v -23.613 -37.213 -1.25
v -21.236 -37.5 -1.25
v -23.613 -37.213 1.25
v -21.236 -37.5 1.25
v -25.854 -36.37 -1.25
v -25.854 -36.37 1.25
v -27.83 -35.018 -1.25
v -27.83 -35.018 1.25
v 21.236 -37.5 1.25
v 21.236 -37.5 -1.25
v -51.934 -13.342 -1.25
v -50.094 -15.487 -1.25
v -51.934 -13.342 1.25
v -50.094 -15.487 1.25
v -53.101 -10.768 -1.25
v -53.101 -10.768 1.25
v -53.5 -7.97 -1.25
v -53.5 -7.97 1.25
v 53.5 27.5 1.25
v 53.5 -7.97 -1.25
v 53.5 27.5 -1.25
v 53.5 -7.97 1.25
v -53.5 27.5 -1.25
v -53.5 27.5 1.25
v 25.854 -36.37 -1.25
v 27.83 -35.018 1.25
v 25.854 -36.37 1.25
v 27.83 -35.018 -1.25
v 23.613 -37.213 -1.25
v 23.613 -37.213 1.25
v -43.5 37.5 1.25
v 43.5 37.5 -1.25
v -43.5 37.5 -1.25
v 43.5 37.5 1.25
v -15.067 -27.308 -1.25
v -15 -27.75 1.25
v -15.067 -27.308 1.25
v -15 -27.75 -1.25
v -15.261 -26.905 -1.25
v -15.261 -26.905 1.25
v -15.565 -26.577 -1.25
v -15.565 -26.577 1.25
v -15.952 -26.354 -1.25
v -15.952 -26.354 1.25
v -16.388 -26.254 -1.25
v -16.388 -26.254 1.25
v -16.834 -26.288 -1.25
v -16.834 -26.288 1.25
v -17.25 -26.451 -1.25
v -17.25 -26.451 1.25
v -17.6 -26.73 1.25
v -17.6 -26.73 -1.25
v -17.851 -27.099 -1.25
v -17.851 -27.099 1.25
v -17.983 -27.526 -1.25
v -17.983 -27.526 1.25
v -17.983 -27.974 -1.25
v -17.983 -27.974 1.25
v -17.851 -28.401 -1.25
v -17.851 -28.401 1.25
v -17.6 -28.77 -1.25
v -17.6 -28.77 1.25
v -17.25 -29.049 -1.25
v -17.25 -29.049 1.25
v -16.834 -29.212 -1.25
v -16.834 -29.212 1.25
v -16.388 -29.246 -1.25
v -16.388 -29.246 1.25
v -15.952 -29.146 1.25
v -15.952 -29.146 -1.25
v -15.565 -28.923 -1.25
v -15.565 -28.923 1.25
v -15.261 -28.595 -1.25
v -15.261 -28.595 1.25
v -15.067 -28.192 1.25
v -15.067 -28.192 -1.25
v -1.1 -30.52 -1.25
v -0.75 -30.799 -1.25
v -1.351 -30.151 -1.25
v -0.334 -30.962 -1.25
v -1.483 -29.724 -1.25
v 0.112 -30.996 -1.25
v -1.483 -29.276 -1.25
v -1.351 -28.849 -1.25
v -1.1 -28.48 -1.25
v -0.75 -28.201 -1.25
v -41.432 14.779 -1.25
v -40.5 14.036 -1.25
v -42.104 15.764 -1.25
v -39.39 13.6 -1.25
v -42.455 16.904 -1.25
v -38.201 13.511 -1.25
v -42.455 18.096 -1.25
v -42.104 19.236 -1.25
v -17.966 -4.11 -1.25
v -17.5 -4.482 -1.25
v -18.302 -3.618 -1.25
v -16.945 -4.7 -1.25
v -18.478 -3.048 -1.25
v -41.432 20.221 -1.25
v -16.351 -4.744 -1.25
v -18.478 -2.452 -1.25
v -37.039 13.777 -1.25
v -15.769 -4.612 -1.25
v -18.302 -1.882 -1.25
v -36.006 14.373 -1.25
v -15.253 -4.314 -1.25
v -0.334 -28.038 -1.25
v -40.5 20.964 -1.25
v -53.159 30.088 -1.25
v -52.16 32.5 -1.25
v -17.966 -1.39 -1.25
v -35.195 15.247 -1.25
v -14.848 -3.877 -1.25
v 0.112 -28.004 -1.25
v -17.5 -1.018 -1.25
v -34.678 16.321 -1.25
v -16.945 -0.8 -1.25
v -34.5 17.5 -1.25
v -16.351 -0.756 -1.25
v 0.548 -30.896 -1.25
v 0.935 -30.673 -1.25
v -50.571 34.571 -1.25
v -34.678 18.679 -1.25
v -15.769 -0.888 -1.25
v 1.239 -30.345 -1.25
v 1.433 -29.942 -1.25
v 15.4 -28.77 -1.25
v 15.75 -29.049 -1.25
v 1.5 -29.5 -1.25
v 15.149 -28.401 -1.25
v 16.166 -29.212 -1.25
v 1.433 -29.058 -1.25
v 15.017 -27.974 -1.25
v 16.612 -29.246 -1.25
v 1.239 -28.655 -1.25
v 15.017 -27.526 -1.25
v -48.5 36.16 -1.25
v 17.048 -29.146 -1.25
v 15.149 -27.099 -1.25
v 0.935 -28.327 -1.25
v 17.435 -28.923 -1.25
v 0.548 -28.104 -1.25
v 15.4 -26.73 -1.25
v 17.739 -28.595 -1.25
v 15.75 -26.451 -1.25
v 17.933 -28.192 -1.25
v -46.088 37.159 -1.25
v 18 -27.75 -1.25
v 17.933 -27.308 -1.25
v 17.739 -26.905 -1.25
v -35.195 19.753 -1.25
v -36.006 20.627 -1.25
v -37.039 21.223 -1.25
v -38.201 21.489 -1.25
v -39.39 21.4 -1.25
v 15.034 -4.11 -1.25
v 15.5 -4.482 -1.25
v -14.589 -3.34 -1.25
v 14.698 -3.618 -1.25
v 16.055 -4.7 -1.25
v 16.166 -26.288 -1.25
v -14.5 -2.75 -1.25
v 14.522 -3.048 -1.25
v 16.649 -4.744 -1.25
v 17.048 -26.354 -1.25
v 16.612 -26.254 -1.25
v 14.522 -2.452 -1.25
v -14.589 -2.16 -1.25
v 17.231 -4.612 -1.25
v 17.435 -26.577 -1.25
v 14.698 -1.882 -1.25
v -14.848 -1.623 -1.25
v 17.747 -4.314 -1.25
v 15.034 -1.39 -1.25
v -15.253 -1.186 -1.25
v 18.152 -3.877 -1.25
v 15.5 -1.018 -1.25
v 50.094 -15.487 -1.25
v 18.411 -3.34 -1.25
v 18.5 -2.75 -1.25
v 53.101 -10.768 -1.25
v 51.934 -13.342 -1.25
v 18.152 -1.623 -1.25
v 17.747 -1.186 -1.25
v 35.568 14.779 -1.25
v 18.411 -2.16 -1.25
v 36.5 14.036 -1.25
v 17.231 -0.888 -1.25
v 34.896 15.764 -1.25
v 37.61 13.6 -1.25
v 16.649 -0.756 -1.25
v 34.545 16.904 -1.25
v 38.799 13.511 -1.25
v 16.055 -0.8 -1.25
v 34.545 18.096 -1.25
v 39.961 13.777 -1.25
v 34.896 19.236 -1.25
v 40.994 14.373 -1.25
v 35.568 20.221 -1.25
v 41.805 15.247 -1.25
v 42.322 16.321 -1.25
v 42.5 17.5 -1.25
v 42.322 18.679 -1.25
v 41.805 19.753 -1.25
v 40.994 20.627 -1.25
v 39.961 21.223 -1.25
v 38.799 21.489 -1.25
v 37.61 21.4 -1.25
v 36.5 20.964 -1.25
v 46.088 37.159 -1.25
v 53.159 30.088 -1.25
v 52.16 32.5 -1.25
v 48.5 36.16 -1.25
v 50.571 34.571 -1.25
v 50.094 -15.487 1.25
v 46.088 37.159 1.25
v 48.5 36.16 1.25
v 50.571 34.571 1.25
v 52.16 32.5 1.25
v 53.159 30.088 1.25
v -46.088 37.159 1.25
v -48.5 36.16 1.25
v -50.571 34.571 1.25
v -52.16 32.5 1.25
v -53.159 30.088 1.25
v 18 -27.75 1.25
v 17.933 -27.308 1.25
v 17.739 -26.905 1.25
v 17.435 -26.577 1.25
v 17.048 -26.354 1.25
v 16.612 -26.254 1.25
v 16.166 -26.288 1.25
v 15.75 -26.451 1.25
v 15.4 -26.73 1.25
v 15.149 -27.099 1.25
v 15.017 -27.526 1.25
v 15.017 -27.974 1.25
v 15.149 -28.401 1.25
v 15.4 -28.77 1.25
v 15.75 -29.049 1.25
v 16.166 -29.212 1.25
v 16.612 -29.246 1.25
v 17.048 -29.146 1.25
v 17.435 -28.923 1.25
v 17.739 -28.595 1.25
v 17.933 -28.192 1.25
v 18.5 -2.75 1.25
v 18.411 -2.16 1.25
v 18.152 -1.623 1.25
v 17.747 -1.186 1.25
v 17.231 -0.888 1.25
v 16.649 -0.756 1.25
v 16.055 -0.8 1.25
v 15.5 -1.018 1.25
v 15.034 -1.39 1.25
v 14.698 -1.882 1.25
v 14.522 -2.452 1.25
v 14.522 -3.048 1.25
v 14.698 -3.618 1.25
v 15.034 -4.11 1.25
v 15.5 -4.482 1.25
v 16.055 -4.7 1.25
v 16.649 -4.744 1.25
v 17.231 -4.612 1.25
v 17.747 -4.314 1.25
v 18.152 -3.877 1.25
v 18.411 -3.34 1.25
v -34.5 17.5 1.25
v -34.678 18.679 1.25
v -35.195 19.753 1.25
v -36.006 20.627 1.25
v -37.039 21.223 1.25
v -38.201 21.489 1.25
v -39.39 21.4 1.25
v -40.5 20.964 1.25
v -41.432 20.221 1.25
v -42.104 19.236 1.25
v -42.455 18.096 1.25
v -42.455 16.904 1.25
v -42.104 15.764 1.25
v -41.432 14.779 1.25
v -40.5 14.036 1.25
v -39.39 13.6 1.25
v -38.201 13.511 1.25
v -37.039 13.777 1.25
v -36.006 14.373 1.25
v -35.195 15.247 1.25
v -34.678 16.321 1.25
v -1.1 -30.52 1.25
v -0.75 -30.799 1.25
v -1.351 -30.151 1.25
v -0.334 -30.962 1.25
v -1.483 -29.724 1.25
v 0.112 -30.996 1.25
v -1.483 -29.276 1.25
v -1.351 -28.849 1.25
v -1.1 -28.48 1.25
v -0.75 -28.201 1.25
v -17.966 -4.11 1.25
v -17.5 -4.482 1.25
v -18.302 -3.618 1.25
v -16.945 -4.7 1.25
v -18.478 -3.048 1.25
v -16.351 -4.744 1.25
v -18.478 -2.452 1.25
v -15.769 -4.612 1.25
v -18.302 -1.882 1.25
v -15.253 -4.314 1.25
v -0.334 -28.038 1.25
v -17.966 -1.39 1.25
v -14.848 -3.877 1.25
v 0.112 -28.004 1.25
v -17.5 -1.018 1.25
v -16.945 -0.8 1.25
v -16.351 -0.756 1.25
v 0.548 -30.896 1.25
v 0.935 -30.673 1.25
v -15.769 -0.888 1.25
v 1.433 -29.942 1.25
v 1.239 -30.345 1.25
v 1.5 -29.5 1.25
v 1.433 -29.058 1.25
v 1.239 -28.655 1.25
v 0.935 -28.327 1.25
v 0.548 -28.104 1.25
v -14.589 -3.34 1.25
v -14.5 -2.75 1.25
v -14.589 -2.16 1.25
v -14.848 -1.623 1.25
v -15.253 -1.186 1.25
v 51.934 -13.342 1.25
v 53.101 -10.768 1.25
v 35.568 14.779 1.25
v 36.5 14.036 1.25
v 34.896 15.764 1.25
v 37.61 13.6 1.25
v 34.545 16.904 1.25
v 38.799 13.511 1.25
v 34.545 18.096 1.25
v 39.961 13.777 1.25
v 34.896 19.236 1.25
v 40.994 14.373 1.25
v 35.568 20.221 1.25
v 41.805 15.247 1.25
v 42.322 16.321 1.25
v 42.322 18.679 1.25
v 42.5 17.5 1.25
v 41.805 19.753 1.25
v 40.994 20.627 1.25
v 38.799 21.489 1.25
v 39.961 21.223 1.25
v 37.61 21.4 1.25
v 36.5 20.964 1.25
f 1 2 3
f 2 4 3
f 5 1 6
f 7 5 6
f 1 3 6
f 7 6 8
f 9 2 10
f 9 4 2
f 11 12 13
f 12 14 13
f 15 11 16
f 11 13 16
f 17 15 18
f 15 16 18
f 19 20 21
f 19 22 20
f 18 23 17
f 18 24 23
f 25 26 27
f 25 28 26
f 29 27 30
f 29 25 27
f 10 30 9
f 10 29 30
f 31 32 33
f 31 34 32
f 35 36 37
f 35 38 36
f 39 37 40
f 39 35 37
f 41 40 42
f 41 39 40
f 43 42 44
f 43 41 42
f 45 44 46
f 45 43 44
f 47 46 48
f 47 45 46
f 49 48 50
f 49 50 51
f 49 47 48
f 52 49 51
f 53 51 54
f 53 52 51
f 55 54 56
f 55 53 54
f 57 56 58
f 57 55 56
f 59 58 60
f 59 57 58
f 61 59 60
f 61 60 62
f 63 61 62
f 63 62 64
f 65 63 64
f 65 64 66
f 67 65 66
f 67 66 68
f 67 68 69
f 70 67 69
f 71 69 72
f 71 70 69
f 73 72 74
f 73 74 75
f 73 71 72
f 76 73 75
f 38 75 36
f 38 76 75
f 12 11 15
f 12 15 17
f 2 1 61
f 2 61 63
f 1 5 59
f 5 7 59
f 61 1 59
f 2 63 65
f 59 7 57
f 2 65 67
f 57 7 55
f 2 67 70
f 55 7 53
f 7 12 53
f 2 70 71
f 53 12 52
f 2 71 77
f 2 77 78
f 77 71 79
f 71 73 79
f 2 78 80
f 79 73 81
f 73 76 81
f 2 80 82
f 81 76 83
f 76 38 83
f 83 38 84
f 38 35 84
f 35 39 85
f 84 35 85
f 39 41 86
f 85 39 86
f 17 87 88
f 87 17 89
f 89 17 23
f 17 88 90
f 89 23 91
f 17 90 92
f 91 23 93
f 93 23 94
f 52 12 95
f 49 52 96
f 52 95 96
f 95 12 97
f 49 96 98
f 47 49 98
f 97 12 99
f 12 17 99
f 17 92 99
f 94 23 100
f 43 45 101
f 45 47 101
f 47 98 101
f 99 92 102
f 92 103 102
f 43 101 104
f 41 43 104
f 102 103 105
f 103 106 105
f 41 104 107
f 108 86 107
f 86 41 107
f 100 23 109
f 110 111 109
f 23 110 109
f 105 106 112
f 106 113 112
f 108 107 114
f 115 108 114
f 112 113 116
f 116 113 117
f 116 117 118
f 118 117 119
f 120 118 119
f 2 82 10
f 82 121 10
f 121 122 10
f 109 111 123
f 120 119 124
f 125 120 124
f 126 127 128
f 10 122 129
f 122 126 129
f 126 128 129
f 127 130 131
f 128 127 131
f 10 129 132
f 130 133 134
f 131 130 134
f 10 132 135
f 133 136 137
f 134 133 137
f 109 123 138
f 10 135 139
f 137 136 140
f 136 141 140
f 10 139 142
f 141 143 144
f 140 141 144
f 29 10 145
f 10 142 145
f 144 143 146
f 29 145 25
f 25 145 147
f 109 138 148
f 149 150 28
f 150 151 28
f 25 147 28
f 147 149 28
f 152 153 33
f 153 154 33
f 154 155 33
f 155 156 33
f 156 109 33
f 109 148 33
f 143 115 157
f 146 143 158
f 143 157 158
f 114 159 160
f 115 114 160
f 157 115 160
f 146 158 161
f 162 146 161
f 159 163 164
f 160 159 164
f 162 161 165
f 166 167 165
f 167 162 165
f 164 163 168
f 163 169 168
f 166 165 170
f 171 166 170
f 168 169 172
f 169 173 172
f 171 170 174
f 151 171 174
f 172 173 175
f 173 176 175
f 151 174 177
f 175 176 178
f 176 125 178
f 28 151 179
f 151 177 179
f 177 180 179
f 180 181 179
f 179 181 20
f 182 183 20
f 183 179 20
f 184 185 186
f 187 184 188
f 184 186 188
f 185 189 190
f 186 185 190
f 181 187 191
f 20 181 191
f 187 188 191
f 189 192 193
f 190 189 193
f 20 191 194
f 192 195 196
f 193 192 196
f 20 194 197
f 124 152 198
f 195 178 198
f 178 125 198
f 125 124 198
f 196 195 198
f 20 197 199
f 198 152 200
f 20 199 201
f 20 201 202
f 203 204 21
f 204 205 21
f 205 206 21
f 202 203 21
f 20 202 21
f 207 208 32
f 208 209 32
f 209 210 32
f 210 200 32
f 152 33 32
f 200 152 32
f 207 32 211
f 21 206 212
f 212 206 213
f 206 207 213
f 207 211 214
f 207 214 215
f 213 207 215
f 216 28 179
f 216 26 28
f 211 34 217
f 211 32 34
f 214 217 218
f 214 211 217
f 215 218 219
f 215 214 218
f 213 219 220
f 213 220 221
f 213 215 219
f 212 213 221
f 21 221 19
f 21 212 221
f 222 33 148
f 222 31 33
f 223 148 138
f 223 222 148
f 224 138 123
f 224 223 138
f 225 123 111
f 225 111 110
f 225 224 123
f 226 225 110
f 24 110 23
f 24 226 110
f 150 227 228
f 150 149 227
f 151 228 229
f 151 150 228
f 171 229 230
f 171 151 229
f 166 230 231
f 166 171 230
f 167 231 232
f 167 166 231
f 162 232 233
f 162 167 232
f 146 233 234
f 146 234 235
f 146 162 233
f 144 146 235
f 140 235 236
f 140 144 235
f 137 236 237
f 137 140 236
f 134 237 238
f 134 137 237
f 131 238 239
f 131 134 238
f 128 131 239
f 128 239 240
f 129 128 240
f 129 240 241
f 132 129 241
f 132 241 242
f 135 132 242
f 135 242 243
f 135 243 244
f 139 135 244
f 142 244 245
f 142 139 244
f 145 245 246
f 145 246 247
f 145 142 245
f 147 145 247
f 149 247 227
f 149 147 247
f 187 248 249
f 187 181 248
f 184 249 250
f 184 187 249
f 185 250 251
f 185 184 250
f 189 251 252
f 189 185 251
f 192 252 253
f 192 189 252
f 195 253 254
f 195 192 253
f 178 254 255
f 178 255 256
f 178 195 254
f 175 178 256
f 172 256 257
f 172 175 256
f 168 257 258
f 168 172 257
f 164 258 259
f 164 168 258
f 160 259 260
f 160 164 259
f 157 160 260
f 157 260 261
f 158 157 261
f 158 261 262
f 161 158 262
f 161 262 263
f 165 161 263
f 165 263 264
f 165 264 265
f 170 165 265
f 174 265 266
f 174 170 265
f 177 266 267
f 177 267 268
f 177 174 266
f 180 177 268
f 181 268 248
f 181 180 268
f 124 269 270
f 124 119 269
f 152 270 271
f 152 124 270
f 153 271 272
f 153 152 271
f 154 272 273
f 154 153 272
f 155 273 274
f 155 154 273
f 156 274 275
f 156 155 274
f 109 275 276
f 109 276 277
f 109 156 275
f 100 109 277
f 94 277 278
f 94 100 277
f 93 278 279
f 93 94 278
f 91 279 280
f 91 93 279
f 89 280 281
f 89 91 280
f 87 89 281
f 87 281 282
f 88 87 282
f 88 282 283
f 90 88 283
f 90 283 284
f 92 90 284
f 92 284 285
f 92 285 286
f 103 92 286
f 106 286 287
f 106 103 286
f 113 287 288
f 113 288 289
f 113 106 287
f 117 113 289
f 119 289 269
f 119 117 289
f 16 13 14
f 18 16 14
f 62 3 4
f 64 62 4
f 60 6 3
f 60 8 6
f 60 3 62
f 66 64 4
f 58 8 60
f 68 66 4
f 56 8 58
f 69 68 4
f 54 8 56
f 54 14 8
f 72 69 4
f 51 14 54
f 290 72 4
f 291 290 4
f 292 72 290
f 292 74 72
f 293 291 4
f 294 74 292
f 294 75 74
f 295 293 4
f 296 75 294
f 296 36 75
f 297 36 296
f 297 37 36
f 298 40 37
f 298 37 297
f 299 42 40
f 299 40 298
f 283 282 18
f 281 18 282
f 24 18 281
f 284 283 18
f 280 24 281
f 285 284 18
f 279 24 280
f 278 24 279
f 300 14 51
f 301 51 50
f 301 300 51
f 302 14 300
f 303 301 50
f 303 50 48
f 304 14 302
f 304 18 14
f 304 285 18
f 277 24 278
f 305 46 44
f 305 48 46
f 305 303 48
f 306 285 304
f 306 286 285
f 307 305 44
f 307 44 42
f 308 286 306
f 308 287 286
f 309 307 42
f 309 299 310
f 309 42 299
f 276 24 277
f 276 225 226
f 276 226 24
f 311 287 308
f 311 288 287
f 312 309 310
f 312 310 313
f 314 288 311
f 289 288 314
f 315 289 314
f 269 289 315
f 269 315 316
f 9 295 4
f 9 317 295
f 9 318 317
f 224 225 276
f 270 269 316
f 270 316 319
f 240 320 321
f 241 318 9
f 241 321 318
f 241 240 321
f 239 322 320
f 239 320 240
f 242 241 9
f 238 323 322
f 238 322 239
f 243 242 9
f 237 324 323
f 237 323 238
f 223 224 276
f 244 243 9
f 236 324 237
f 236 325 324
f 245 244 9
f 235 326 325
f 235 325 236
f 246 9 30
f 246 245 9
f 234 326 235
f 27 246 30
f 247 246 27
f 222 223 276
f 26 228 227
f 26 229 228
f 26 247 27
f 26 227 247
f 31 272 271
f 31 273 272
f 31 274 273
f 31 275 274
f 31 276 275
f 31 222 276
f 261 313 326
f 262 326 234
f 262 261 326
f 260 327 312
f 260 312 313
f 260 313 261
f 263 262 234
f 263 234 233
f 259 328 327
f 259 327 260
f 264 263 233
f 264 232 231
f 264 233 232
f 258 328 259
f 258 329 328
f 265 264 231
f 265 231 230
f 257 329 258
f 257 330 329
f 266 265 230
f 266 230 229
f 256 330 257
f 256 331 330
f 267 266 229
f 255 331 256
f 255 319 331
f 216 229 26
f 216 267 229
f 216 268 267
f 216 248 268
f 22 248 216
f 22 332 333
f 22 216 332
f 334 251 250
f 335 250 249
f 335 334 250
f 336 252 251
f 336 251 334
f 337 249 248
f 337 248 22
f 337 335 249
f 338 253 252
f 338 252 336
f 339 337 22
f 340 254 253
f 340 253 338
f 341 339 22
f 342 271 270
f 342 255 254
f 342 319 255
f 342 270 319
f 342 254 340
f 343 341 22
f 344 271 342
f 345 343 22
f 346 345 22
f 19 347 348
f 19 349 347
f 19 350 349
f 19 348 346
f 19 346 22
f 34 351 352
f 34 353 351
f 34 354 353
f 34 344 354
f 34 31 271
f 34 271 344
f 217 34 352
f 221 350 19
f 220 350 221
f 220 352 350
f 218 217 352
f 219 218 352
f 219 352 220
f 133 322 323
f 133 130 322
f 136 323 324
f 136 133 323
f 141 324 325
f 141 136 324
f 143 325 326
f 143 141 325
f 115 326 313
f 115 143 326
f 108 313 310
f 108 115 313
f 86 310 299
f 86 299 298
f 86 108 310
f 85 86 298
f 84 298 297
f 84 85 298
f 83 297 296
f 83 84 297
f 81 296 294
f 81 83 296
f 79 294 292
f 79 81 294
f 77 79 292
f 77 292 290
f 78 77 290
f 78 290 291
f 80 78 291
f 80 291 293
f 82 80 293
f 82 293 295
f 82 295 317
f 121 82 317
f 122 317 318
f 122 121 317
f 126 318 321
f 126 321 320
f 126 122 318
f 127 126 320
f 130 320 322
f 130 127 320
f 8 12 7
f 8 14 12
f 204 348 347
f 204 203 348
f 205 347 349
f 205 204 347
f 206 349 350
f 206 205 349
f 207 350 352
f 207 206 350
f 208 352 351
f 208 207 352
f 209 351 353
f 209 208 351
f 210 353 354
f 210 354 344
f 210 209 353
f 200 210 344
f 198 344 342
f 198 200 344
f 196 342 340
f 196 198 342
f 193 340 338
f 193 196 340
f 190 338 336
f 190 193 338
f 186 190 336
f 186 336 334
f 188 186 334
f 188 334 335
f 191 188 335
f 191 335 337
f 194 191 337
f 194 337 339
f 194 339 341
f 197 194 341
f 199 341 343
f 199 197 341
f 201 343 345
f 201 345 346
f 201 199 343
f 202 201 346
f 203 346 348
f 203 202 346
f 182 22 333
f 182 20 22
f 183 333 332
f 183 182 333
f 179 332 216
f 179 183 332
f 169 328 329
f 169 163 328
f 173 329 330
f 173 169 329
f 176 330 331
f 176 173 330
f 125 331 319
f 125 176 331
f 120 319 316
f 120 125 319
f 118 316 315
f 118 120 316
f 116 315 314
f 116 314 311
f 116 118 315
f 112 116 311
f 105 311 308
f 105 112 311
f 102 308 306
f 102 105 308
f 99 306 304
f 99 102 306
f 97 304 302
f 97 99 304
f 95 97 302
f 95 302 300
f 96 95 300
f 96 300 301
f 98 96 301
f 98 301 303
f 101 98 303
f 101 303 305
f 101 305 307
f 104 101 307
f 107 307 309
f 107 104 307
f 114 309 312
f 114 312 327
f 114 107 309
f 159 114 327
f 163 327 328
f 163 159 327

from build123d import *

# Parameters (mm, degrees)
SKETCH1_3_R         = 1.5
SKETCH1_3_R_2       = 2
SKETCH1_3_R_3       = 4
BOSS_EXTRUDE2_DEPTH = 1.25
FILLET2_R           = 10


with BuildPart() as part:
    # Sketch1<3> → Boss-Extrude2 (new, symmetric)
    with BuildSketch(Plane.XY):
        Polygon((53.5, -12.5), (53.5, 37.5), (-53.5, 37.5), (-53.5, -12.5), (-25, -37.5), (25, -37.5), align=None)
        with Locations((0, -29.5)):
            Circle(SKETCH1_3_R, mode=Mode.SUBTRACT)
        with Locations((-16.5, -27.75)):
            Circle(SKETCH1_3_R, mode=Mode.SUBTRACT)
        with Locations((16.5, -27.75)):
            Circle(SKETCH1_3_R, mode=Mode.SUBTRACT)
        with Locations((16.5, -2.75)):
            Circle(SKETCH1_3_R_2, mode=Mode.SUBTRACT)
        with Locations((-38.5, 17.5)):
            Circle(SKETCH1_3_R_3, mode=Mode.SUBTRACT)
        with Locations((38.5, 17.5)):
            Circle(SKETCH1_3_R_3, mode=Mode.SUBTRACT)
        with Locations((-16.5, -2.75)):
            Circle(SKETCH1_3_R_2, mode=Mode.SUBTRACT)
    extrude(amount=BOSS_EXTRUDE2_DEPTH, both=True)

    # Fillet2
    fillet2_edges = [part.edges().sort_by_distance(p)[0] for p in [
        (53.5, -12.5, 0),
        (25, -37.5, 0),
        (-25, -37.5, 0),
        (-53.5, -12.5, 0),
        (-53.5, 37.5, 0),
        (53.5, 37.5, 0),
    ]]
    fillet(fillet2_edges, radius=FILLET2_R)


solid = part.part
